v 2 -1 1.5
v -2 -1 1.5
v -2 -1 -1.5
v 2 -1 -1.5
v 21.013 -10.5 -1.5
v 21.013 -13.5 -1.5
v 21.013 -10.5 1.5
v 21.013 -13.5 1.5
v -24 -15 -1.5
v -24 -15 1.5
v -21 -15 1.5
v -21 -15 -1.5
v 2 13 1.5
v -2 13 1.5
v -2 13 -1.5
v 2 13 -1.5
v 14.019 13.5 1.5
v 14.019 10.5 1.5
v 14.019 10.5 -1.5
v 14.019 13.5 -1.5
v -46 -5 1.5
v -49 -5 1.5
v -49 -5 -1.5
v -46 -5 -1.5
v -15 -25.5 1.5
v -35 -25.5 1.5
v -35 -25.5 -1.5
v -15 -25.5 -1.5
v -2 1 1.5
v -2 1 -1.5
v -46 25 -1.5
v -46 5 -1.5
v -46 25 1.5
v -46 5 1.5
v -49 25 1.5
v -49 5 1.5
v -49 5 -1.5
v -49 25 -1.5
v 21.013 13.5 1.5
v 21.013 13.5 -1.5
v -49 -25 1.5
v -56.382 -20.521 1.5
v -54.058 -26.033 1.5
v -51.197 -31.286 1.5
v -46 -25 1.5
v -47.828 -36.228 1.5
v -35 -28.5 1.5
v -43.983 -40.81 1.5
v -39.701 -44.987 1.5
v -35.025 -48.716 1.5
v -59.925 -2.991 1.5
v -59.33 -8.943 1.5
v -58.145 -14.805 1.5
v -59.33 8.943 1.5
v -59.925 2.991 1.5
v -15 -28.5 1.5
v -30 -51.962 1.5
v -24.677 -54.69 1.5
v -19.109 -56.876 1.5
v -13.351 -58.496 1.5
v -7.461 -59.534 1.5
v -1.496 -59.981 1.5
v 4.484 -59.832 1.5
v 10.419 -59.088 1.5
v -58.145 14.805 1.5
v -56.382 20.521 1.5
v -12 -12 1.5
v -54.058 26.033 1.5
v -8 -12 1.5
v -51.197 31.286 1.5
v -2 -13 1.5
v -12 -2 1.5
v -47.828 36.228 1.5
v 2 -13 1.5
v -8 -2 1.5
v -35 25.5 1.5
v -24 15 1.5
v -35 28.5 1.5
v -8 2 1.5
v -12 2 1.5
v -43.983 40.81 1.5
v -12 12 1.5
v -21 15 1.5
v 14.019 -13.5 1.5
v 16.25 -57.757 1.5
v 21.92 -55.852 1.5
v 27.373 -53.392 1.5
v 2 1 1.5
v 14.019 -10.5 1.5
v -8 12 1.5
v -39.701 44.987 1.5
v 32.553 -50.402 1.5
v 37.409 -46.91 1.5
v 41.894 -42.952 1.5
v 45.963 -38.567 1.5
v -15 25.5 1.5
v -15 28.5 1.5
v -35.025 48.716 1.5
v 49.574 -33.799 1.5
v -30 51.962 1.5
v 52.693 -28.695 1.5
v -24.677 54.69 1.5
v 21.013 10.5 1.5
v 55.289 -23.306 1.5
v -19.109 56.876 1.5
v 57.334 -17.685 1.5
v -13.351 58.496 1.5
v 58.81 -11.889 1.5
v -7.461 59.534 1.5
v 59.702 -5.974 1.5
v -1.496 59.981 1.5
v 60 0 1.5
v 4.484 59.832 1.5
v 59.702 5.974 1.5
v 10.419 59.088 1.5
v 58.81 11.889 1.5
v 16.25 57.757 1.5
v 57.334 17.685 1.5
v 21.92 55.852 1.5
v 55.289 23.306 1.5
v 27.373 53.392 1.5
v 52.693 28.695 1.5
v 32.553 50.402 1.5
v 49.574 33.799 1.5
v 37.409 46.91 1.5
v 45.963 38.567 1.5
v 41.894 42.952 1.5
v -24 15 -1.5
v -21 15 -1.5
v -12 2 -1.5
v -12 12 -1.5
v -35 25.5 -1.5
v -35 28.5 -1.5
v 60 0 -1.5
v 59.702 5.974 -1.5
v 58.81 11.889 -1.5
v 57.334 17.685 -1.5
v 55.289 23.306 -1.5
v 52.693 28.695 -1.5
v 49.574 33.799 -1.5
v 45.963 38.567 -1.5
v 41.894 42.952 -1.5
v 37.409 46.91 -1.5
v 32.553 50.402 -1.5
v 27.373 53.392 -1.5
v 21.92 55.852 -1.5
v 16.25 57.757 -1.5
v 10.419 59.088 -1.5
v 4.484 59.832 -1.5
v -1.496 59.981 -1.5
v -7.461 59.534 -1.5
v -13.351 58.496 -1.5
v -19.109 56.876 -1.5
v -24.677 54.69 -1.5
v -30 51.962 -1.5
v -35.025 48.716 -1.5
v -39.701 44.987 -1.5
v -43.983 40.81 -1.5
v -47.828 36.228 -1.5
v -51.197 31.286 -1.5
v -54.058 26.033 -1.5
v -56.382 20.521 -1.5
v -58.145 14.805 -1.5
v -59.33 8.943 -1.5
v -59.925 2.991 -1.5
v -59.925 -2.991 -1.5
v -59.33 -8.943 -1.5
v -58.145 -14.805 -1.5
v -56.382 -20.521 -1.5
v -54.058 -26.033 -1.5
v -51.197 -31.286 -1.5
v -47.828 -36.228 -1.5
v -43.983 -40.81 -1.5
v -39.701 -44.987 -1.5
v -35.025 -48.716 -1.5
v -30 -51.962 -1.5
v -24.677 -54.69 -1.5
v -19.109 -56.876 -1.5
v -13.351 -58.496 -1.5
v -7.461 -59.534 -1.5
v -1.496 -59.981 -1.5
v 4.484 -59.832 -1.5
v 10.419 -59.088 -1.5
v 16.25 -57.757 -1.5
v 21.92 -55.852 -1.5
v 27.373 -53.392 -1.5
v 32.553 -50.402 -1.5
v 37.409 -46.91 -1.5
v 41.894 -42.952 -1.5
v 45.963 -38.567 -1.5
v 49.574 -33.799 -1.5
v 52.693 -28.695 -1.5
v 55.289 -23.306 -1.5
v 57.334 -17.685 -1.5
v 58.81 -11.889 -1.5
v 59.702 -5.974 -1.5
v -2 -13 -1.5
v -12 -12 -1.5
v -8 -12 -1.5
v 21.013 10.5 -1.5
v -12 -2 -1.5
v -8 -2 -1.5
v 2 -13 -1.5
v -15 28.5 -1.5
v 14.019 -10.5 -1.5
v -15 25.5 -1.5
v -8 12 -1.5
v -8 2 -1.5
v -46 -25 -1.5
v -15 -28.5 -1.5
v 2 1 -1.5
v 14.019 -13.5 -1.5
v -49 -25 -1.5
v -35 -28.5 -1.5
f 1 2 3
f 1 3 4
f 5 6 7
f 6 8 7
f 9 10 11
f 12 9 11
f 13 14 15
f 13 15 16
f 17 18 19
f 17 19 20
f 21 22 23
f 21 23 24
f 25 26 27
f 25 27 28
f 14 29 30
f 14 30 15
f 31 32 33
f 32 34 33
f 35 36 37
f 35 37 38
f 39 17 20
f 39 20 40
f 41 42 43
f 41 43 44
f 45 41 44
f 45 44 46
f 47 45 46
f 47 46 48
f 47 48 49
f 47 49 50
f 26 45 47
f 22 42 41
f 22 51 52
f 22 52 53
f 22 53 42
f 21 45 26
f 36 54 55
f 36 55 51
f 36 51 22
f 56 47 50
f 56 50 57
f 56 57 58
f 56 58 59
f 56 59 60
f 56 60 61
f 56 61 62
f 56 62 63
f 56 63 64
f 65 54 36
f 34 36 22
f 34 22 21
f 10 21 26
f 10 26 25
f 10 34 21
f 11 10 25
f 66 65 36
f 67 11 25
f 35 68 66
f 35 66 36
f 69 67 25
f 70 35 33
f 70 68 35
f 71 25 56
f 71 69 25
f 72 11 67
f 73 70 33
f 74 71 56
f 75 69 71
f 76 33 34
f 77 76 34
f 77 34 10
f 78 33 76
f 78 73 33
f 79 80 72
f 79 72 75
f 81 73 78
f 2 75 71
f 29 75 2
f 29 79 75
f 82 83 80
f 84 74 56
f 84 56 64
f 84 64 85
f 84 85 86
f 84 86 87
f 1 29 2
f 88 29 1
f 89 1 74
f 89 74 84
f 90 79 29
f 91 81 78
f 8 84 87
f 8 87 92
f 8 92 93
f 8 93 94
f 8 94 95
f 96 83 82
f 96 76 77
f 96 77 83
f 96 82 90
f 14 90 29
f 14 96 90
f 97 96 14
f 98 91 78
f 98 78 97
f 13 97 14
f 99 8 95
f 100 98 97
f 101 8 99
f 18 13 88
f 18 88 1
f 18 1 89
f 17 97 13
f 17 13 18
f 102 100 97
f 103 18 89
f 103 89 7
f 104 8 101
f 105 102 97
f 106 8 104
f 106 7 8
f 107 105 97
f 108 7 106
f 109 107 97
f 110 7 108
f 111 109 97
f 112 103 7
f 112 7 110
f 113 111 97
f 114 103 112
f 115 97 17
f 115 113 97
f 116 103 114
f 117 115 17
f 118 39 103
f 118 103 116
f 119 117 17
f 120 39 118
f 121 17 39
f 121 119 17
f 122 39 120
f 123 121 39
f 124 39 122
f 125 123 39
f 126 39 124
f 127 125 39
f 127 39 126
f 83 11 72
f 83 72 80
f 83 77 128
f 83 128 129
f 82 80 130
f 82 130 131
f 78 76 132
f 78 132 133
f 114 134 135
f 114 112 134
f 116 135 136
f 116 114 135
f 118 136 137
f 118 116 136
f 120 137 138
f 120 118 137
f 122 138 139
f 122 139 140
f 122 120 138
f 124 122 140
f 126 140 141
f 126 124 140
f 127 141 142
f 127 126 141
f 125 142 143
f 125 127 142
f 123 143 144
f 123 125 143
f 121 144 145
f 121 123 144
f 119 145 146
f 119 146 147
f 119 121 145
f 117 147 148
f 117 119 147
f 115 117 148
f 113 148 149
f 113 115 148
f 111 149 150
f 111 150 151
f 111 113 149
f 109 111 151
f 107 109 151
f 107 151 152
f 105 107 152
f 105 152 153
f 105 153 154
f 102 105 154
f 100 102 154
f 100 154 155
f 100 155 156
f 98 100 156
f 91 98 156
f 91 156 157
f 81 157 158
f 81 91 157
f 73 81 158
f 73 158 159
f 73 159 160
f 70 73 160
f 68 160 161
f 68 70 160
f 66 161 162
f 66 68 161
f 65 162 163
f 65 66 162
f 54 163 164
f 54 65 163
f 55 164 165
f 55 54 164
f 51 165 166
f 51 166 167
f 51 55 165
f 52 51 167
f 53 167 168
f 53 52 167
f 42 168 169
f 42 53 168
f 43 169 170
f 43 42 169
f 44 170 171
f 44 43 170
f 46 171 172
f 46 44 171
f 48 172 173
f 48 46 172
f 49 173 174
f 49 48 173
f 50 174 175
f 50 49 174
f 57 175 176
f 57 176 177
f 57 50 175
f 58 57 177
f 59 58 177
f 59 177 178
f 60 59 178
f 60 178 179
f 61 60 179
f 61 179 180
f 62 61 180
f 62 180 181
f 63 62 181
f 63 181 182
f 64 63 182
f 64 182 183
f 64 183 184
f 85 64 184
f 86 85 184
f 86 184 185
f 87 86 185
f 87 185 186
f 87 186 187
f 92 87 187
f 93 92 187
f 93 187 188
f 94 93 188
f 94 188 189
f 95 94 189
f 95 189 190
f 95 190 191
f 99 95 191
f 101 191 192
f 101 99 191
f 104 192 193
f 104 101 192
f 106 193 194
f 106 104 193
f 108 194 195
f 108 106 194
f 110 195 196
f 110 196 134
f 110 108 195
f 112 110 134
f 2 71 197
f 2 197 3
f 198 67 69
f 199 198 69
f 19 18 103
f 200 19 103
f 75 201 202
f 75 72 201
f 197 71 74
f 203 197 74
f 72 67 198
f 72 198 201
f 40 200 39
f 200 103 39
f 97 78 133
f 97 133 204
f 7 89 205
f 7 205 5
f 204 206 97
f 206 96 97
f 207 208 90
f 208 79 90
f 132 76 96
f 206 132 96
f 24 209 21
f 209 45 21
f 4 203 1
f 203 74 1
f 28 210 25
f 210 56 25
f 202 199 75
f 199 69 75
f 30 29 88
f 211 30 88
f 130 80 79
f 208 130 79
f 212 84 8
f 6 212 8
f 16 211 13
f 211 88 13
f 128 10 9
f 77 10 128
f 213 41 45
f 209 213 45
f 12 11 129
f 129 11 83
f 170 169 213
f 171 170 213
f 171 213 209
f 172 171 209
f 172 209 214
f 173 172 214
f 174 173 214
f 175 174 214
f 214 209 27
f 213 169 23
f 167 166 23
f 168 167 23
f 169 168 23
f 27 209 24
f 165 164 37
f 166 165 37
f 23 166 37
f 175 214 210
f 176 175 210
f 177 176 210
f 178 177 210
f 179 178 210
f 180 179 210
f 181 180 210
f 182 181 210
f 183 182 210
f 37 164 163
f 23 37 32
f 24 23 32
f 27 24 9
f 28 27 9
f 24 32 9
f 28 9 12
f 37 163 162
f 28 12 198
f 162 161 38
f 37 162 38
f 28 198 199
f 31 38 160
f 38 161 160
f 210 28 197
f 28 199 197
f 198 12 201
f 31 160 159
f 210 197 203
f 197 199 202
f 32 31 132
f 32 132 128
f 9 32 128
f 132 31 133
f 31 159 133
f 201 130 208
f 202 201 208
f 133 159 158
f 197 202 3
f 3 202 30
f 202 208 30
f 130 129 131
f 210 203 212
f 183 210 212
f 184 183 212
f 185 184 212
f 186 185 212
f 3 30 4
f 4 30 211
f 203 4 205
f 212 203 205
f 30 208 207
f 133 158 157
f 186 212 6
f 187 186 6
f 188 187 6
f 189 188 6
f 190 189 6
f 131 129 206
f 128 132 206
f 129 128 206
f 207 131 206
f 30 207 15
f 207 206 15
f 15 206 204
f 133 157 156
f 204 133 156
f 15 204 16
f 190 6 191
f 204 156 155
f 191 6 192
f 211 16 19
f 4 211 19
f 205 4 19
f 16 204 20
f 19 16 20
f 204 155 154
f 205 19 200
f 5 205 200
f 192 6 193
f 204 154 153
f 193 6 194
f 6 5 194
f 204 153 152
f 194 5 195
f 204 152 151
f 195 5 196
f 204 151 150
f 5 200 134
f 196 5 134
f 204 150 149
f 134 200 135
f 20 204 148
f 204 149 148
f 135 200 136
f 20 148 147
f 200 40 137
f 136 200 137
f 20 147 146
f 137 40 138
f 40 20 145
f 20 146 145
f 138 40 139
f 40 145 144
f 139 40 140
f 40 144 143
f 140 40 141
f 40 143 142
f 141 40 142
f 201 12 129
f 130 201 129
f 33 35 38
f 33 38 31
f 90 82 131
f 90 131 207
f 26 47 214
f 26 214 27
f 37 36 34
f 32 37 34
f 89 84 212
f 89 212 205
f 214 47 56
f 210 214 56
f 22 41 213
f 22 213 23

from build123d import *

# Parameters (mm, degrees)
SKETCH1_R           = 60
SKETCH1_W           = 20
SKETCH1_H           = 3
SKETCH1_W_2         = 3
SKETCH1_H_2         = 20
SKETCH1_H_3         = 30
SKETCH1_W_3         = 6.993462014
SKETCH1_W_4         = 4
SKETCH1_H_4         = 12
SKETCH1_H_5         = 10
BOSS_EXTRUDE1_DEPTH = 1.5


with BuildPart() as part:
    # Sketch1 → Boss-Extrude1 (new body, symmetric)
    with BuildSketch(Plane.XY):
        Circle(SKETCH1_R)
        with Locations((-25, -27)):
            Rectangle(SKETCH1_W, SKETCH1_H, mode=Mode.SUBTRACT)
        with Locations((-47.5, 15)):
            Rectangle(SKETCH1_W_2, SKETCH1_H_2, mode=Mode.SUBTRACT)
        with Locations((-47.5, -15)):
            Rectangle(SKETCH1_W_2, SKETCH1_H_2, mode=Mode.SUBTRACT)
        with Locations((-22.5, 0)):
            Rectangle(SKETCH1_W_2, SKETCH1_H_3, mode=Mode.SUBTRACT)
        with Locations((-25, 27)):
            Rectangle(SKETCH1_W, SKETCH1_H, mode=Mode.SUBTRACT)
        with Locations((17.516157806, -12)):
            Rectangle(SKETCH1_W_3, SKETCH1_H, mode=Mode.SUBTRACT)
        with Locations((17.516157806, 12)):
            Rectangle(SKETCH1_W_3, SKETCH1_H, mode=Mode.SUBTRACT)
        with Locations((0, 7)):
            Rectangle(SKETCH1_W_4, SKETCH1_H_4, mode=Mode.SUBTRACT)
        with Locations((0, -7)):
            Rectangle(SKETCH1_W_4, SKETCH1_H_4, mode=Mode.SUBTRACT)
        with Locations((-10, 7)):
            Rectangle(SKETCH1_W_4, SKETCH1_H_5, mode=Mode.SUBTRACT)
        with Locations((-10, -7)):
            Rectangle(SKETCH1_W_4, SKETCH1_H_5, mode=Mode.SUBTRACT)
    extrude(amount=BOSS_EXTRUDE1_DEPTH, both=True)


solid = part.part
